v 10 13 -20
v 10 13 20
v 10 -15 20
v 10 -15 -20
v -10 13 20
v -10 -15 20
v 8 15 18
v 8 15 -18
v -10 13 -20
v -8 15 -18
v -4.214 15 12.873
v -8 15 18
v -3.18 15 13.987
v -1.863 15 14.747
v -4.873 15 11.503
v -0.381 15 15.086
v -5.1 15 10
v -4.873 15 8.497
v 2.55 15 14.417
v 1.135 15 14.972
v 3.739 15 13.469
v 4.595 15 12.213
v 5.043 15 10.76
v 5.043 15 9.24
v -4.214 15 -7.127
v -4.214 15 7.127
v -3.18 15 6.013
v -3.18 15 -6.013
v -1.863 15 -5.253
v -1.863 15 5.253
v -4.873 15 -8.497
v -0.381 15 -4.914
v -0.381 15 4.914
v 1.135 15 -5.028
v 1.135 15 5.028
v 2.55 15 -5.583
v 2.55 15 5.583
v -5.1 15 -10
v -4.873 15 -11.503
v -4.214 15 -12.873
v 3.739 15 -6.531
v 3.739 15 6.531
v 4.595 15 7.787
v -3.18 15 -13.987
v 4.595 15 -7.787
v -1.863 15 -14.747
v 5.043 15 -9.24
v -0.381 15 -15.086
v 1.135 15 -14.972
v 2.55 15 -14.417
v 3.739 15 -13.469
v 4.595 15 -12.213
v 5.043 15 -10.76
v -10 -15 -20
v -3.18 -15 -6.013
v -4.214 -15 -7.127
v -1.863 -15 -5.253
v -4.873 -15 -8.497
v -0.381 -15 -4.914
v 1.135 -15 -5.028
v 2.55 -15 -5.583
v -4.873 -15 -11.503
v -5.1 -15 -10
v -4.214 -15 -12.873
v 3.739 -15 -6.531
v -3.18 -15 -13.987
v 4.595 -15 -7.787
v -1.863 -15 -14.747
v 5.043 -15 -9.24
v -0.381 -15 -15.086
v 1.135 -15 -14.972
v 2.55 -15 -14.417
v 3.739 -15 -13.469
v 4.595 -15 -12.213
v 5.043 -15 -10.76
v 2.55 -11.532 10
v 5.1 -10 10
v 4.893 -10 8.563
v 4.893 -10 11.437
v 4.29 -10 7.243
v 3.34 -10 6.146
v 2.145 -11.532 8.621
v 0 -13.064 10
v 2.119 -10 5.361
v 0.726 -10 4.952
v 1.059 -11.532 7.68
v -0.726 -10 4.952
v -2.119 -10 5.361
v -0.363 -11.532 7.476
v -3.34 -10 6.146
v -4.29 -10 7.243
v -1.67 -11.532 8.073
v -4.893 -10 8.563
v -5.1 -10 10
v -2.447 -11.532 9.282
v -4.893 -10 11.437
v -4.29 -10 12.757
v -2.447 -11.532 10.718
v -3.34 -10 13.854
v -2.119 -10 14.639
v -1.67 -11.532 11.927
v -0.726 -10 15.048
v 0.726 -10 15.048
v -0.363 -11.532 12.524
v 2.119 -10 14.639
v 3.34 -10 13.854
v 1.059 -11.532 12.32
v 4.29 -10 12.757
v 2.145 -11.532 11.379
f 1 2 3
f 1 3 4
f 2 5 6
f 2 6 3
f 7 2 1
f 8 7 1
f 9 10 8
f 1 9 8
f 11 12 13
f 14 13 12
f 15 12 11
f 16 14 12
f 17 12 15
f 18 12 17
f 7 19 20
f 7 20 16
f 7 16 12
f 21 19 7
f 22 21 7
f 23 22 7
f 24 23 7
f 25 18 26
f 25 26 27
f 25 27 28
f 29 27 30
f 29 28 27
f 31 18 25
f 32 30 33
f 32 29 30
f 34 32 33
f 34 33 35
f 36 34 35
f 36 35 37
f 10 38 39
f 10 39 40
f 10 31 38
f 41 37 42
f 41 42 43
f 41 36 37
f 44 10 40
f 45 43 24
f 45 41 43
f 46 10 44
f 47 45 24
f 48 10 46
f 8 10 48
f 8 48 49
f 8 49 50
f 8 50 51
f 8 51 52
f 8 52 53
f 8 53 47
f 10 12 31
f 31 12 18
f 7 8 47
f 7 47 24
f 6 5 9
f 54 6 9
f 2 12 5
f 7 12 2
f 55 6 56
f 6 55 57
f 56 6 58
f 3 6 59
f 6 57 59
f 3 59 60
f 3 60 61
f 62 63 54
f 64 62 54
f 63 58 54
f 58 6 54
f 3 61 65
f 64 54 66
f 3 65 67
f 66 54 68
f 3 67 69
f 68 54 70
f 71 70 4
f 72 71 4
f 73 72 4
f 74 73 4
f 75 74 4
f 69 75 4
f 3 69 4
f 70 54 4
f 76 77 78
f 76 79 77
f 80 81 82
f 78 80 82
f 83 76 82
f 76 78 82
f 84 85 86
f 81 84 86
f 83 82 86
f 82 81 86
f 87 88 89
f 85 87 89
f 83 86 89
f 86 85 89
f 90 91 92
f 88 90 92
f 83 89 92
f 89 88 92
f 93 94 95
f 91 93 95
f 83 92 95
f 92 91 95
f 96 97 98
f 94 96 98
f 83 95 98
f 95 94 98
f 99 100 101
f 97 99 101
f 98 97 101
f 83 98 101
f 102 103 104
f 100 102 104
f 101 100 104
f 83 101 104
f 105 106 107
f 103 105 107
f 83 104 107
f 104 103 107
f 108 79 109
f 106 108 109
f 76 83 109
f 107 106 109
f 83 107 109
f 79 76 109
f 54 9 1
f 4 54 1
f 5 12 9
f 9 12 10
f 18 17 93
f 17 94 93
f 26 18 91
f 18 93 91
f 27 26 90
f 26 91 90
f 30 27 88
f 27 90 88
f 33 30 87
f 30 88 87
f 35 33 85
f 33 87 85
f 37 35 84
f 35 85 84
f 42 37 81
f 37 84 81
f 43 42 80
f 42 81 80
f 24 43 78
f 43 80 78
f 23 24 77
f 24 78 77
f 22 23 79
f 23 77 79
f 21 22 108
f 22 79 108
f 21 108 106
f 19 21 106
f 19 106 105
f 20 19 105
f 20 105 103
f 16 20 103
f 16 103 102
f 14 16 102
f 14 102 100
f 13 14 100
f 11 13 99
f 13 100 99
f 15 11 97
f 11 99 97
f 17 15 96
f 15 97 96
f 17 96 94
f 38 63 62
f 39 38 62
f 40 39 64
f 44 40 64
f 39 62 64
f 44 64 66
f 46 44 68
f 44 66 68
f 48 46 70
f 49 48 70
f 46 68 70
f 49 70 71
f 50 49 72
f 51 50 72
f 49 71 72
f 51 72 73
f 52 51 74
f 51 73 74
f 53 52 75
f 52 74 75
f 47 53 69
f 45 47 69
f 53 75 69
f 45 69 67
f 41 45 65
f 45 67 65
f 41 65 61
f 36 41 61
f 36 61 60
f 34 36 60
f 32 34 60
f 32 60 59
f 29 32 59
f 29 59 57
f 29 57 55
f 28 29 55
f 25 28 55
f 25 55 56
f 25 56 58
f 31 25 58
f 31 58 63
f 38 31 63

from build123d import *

# Parameters (mm, degrees)
ESBO_O1_W                  = 20
ESBO_O1_H                  = 40
RESSALTO_EXTRUS_O1_DEPTH   = 15
FURO_ROSCADO_DE_M121_D     = 10.2
FURO_ROSCADO_DE_M122_D     = 10.2
FURO_ROSCADO_DE_M122_DEPTH = 25
FURO_ROSCADO_DE_M122_TIP   = 3.064389157
CHANFRO2_SIZE              = 2


with BuildPart() as part:
    # Esboço1 → Ressalto-extrusão1 (new, symmetric)
    with BuildSketch(Plane(origin=(0, 0, 0), x_dir=(1, 0, 0), z_dir=(0, 1, 0))):
        Rectangle(ESBO_O1_W, ESBO_O1_H)
    extrude(amount=RESSALTO_EXTRUS_O1_DEPTH, both=True)

    # Furo roscado de M121 (through all)
    with Locations(Plane(origin=(0, 15, 0), x_dir=(1, 0, 0), z_dir=(0, 1, 0))):
        with Locations((0, 10)):
            Hole(FURO_ROSCADO_DE_M121_D / 2)

    # Furo roscado de M122
    with Locations(Plane(origin=(0, 15, 0), x_dir=(1, 0, 0), z_dir=(0, 1, 0))):
        with Locations((0, -10)):
            Hole(FURO_ROSCADO_DE_M122_D / 2, depth=FURO_ROSCADO_DE_M122_DEPTH)
            with Locations((0, 0, -(FURO_ROSCADO_DE_M122_DEPTH + FURO_ROSCADO_DE_M122_TIP / 2))):  # 118° drill point
                Cone(0, FURO_ROSCADO_DE_M122_D / 2, FURO_ROSCADO_DE_M122_TIP, mode=Mode.SUBTRACT)

    # Chanfro2
    chanfro2_edges = [part.edges().sort_by_distance(p)[0] for p in [
        (-10, 15, 0),
        (0, 15, 20),
        (10, 15, 0),
        (0, 15, -20),
    ]]
    chamfer(chanfro2_edges, length=CHANFRO2_SIZE)


solid = part.part
